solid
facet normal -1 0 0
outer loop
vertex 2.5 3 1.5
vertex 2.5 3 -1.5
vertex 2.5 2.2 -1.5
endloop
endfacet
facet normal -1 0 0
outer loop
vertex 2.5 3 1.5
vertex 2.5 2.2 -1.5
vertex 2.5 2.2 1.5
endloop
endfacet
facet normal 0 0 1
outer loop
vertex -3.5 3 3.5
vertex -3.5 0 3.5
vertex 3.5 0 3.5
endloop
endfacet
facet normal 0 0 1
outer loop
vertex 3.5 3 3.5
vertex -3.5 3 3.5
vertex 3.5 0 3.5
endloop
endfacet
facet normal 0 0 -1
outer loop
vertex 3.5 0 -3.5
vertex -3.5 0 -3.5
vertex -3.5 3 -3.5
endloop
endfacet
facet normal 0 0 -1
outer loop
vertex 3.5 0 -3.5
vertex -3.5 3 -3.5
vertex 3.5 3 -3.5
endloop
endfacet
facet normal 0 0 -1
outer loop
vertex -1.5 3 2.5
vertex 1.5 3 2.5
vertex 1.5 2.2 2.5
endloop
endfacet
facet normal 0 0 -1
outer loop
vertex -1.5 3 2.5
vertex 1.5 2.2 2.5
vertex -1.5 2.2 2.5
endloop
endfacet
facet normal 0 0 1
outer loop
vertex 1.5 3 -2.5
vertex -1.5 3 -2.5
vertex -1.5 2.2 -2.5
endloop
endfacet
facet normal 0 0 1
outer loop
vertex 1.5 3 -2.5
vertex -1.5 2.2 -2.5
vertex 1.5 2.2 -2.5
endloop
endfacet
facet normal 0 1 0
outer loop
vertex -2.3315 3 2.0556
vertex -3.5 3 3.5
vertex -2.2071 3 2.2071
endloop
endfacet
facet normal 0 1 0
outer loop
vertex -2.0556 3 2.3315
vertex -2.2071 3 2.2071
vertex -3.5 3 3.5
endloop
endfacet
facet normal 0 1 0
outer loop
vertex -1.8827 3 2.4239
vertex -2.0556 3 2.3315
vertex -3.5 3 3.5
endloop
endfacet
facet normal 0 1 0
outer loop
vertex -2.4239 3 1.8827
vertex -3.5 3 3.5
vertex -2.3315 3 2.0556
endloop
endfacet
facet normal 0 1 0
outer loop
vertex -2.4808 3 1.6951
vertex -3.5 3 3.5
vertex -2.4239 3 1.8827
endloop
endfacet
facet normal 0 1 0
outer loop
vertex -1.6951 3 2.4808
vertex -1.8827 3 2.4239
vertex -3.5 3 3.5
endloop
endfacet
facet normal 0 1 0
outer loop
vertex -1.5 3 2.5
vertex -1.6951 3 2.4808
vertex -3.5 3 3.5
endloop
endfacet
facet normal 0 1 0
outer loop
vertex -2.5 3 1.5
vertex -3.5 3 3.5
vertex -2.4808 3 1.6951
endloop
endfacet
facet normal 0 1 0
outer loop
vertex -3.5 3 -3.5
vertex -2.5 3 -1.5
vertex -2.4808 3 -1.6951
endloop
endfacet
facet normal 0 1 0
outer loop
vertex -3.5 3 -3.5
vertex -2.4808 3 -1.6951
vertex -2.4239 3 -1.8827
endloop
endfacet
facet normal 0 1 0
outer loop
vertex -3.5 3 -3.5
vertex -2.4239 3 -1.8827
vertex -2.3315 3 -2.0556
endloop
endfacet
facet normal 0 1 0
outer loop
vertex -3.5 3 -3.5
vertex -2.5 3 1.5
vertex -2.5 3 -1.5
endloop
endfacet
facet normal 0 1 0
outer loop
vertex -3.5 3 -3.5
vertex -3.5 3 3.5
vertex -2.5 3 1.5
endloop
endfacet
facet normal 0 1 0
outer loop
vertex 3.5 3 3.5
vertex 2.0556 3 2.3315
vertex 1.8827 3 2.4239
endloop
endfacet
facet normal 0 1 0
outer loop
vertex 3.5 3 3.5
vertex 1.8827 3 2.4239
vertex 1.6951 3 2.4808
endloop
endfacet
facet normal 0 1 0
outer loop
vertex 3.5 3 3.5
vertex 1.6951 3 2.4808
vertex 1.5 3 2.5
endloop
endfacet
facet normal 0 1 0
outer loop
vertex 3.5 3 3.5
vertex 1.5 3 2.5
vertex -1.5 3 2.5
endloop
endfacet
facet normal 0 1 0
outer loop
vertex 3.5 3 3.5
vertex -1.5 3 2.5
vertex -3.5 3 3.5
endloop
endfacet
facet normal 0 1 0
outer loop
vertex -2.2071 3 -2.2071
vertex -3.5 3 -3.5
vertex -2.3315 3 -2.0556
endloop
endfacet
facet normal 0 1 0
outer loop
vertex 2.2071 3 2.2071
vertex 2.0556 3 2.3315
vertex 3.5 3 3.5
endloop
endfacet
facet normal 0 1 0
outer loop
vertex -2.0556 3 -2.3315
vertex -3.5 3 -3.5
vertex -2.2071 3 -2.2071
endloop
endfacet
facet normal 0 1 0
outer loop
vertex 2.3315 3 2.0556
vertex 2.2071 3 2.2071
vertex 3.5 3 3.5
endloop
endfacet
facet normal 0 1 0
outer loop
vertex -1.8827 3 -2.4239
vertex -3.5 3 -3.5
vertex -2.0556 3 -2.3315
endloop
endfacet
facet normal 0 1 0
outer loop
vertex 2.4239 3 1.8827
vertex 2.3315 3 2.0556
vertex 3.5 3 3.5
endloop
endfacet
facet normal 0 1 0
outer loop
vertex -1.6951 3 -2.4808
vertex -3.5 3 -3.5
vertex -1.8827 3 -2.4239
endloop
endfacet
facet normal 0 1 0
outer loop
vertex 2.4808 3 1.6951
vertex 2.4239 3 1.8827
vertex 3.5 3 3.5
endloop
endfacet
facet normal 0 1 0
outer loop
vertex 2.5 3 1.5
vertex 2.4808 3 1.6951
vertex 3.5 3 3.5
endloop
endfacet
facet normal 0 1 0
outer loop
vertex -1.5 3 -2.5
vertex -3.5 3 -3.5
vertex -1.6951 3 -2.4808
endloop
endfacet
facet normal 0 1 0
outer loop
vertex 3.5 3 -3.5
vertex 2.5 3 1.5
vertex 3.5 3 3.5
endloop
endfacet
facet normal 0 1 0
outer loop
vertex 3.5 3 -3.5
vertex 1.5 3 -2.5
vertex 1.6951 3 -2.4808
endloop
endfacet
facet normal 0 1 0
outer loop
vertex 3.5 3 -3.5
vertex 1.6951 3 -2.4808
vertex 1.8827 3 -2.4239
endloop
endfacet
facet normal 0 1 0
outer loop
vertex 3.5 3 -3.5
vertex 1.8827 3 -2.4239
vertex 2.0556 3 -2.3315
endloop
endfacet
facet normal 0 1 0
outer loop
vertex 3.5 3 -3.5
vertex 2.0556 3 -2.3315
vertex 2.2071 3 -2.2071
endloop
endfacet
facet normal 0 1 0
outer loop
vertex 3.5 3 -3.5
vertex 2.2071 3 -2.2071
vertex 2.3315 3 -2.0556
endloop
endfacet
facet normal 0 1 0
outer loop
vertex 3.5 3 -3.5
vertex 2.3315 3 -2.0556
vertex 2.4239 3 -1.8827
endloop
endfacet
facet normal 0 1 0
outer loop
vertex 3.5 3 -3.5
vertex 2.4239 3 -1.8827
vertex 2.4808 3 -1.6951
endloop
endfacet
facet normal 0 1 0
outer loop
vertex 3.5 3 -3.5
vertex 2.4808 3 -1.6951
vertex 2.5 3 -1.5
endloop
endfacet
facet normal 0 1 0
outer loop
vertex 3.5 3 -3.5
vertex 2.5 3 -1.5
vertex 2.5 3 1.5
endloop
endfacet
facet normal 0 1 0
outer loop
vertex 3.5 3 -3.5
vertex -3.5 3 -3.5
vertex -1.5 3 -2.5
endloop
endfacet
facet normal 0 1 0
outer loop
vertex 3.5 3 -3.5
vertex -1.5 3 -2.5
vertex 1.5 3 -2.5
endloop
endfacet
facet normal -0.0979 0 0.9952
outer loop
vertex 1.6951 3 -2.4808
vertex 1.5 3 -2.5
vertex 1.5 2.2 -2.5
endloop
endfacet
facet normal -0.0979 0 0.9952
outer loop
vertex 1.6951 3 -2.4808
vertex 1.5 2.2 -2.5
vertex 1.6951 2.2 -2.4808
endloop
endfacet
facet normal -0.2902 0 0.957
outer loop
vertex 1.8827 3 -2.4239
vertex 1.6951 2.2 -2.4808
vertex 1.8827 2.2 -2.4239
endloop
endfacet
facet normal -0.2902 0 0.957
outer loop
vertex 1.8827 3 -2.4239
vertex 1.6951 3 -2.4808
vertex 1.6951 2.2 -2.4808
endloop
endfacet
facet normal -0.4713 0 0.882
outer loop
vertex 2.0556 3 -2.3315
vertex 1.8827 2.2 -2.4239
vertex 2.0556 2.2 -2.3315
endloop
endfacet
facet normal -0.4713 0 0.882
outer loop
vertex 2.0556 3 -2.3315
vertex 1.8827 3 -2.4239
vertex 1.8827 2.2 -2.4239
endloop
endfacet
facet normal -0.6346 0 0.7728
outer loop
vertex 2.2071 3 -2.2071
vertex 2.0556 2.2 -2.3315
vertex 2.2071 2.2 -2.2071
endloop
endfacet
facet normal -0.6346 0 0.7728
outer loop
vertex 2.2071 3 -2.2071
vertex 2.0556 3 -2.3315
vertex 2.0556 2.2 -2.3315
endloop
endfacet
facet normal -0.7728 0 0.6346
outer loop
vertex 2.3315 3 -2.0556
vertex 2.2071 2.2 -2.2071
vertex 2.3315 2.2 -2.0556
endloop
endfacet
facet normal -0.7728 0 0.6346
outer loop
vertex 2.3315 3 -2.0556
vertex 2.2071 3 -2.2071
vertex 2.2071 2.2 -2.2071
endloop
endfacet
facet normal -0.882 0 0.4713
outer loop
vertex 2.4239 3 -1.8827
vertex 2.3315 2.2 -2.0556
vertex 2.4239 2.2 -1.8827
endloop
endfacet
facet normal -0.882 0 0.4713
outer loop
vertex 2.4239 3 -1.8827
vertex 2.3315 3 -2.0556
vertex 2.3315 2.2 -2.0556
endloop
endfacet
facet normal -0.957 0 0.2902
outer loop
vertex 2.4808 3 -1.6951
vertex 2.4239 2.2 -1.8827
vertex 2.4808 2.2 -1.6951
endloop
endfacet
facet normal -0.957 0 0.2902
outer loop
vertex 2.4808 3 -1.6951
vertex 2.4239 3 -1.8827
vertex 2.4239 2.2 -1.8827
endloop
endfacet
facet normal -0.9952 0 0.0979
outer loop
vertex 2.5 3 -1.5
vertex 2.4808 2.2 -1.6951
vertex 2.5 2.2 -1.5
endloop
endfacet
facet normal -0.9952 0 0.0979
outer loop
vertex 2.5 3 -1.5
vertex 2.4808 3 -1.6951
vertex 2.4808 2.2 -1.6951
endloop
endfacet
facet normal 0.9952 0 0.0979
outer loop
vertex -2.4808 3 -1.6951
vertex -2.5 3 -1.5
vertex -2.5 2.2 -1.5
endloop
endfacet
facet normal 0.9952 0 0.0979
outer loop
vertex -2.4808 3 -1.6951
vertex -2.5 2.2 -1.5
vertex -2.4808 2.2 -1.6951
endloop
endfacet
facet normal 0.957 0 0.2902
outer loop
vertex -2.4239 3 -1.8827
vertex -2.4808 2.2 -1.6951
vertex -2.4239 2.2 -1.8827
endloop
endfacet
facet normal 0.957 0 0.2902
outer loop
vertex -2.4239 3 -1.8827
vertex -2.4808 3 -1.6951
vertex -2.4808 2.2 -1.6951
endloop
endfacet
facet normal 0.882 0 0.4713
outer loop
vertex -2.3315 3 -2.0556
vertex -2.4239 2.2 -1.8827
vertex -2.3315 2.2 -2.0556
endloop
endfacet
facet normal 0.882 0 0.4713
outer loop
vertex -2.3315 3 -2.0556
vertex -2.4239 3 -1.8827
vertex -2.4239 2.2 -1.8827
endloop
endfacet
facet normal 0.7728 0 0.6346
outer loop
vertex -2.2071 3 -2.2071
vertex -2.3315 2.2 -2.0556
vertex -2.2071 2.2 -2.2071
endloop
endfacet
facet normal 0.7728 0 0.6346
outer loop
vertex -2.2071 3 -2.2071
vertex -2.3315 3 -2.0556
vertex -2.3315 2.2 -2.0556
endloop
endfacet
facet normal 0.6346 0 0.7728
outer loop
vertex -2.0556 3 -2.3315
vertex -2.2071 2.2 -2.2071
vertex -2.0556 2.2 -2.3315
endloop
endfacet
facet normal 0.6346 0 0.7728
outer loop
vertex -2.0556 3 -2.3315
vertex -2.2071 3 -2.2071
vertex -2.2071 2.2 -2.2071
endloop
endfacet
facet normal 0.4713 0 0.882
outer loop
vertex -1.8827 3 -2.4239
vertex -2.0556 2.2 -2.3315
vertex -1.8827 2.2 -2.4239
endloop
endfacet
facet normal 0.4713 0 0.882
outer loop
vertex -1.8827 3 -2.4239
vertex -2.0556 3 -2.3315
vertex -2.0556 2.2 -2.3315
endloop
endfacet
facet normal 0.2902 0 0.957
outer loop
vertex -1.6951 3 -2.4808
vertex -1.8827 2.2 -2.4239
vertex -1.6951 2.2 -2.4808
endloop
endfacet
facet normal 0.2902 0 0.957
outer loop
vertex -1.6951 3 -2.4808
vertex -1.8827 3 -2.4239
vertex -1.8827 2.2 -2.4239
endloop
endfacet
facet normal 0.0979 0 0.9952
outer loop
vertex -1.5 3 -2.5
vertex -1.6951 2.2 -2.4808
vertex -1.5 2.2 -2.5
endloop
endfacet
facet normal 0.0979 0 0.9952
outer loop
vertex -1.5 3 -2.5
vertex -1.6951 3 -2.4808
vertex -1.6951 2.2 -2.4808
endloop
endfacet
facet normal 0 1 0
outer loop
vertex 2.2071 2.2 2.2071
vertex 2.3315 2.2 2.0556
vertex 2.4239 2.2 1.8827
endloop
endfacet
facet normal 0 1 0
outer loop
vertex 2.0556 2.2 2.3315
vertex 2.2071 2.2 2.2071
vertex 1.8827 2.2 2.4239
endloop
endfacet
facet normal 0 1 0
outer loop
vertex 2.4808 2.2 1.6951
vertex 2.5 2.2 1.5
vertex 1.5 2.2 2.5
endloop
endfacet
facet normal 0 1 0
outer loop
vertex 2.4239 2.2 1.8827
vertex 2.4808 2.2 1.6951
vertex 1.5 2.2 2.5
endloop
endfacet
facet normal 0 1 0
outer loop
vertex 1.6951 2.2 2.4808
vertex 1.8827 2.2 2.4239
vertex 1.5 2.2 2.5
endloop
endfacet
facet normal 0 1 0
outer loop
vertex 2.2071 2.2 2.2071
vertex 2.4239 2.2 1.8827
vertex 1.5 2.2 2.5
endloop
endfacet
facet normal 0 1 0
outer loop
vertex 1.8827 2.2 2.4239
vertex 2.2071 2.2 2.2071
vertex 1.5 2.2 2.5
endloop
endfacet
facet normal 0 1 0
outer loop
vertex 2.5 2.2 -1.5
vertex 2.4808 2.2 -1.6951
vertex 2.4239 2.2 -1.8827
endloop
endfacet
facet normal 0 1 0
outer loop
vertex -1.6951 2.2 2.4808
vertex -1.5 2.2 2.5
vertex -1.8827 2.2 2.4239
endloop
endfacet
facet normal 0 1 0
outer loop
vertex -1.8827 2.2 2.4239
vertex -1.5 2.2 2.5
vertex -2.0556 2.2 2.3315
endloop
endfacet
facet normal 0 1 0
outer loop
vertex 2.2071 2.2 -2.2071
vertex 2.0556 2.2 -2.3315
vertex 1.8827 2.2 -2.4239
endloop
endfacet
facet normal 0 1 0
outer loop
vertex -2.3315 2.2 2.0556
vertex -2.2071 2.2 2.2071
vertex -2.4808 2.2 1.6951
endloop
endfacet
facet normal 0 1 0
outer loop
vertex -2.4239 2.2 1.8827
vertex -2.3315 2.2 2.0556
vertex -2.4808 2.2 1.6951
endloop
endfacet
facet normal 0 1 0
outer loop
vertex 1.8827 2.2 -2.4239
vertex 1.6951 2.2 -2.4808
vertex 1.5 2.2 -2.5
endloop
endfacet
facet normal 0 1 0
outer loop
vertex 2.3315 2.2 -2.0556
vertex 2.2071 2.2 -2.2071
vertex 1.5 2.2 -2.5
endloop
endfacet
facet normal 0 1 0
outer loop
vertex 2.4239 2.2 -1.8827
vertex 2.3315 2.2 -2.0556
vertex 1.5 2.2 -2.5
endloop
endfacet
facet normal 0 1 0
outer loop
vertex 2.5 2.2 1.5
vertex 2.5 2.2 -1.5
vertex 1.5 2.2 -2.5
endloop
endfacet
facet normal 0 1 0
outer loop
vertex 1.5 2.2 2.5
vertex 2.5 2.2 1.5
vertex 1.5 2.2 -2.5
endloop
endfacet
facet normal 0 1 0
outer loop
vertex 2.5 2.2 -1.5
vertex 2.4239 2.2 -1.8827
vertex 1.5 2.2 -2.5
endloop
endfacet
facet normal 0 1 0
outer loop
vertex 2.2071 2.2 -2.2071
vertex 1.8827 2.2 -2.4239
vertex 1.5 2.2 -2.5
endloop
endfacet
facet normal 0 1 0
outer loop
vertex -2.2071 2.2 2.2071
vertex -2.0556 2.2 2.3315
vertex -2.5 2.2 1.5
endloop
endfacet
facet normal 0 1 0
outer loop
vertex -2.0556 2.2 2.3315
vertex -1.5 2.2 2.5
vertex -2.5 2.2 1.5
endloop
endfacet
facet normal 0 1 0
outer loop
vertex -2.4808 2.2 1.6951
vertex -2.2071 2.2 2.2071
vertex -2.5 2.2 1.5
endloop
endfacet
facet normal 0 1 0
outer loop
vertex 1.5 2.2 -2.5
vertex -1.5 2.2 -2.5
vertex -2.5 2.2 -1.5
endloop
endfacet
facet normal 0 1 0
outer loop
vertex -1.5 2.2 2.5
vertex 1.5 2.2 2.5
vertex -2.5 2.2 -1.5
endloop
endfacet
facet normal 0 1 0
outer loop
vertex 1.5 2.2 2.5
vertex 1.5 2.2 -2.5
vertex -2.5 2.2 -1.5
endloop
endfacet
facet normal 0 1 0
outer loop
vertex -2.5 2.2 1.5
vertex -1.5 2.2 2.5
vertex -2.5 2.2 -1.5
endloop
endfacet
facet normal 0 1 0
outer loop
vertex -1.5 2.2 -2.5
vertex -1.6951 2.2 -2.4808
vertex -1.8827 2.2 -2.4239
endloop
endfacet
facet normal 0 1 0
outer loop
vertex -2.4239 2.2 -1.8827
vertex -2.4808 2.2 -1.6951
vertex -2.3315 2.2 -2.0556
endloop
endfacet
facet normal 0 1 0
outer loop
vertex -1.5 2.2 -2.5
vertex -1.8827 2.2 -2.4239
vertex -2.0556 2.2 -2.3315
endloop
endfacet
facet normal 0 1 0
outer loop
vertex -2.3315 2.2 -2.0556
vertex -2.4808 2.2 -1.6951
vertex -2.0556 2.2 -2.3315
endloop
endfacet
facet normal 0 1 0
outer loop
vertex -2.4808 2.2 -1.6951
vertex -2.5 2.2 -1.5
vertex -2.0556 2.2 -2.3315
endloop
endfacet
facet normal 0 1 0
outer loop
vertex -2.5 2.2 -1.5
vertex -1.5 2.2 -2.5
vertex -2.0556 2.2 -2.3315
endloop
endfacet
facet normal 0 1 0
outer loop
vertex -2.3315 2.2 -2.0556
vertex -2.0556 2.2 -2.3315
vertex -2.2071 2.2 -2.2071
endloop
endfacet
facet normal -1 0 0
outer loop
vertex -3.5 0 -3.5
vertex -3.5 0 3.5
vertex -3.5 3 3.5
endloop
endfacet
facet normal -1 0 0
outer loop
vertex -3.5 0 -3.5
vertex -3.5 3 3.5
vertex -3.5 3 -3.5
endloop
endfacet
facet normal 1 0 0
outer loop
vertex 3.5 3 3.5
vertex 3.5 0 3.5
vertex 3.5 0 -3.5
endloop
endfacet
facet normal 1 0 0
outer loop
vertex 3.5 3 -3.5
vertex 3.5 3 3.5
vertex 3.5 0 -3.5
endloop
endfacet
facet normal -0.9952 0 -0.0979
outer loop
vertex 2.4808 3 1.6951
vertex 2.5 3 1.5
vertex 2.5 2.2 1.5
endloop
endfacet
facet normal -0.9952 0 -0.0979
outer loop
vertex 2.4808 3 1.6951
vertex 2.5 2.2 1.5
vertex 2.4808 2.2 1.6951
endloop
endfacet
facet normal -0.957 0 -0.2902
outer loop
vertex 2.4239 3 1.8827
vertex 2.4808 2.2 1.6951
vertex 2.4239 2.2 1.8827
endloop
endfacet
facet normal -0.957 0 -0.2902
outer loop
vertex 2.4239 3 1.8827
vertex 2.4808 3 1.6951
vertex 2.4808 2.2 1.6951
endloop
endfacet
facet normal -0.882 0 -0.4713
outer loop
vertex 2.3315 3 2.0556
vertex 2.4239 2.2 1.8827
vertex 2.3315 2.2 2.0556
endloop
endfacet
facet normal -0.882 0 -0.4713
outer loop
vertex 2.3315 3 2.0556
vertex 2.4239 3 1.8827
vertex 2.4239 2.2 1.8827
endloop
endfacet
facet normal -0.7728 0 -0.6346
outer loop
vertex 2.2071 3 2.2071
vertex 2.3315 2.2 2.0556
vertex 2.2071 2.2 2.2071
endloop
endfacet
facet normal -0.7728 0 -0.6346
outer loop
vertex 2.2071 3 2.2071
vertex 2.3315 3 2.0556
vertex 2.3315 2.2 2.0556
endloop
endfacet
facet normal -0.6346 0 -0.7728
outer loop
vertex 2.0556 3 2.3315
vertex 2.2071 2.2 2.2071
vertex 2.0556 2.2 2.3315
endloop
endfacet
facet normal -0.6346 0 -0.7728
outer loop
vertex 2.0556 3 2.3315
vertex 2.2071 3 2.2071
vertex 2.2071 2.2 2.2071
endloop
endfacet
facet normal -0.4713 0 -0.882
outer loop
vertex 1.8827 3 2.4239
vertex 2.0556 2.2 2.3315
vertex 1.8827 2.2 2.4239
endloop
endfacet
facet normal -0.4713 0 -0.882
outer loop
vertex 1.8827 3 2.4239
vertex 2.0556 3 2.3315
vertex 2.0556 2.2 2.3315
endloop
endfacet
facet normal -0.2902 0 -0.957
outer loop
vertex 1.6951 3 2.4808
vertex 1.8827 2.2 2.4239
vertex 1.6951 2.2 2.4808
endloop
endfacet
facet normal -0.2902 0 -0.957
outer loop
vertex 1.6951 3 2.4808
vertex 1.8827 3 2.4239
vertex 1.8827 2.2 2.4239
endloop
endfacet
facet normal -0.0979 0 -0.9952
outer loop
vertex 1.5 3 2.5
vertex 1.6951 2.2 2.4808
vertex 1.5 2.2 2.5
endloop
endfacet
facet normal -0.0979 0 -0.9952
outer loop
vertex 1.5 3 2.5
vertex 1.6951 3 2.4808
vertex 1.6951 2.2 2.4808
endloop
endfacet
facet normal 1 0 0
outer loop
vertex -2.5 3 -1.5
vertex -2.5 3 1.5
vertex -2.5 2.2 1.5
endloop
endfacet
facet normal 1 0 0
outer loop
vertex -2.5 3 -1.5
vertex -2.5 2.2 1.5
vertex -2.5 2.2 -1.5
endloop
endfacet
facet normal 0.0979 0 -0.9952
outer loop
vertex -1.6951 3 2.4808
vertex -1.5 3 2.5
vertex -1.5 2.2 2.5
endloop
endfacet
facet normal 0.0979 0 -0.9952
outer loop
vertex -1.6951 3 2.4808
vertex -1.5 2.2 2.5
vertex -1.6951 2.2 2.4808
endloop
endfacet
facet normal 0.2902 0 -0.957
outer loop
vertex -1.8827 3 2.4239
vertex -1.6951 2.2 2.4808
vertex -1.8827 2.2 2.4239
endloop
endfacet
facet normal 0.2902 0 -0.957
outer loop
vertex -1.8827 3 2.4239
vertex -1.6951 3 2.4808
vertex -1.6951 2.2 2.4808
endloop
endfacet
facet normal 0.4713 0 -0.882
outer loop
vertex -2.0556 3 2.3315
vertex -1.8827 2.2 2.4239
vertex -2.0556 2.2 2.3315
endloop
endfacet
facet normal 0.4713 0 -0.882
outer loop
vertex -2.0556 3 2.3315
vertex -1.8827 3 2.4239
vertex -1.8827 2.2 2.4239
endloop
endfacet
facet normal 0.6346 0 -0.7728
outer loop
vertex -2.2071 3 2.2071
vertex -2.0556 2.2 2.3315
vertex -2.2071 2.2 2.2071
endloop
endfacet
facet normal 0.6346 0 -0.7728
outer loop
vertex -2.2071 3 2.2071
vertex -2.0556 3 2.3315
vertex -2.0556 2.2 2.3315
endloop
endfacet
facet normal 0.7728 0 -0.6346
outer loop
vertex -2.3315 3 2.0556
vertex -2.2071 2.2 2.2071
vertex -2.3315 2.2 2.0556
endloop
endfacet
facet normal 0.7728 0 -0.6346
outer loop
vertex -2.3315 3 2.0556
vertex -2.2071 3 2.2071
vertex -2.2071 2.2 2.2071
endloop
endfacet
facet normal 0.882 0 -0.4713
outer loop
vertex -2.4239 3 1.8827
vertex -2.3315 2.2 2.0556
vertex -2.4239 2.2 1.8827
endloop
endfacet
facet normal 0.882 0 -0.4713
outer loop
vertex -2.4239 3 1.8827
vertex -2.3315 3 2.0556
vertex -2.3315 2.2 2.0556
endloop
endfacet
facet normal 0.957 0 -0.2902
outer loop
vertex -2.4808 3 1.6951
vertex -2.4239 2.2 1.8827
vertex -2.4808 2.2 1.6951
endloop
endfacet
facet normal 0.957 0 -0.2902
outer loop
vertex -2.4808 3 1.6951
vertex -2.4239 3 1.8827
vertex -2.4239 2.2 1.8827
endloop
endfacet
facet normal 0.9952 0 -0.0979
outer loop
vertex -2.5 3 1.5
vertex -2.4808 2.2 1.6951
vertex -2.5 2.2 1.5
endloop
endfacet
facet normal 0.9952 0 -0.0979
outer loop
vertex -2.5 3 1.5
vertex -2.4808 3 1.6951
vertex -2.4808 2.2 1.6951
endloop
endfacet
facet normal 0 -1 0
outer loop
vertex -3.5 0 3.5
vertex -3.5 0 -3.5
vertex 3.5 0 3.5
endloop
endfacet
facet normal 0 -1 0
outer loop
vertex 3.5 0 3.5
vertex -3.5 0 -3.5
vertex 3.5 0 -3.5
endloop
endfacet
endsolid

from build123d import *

# Parameters (mm, degrees)
SKETCH1_W           = 7
SKETCH1_H           = 7
BOSS_EXTRUDE1_DEPTH = 3
CUT_EXTRUDE1_DEPTH  = 0.8


with BuildPart() as part:
    # Sketch1 → Boss-Extrude1 (new body)
    with BuildSketch(Plane(origin=(0, 0, 0), x_dir=(1, 0, 0), z_dir=(0, 1, 0))):
        Rectangle(SKETCH1_W, SKETCH1_H)
    extrude(amount=BOSS_EXTRUDE1_DEPTH)

    # Sketch2 → Cut-Extrude1 (cut)
    with BuildSketch(Plane(origin=(0, 3, 0), x_dir=(1, 0, 0), z_dir=(0, 1, 0))):
        with BuildLine():
            Line((-1.5, 2.5), (1.5, 2.5))
            ThreePointArc((1.5, 2.5), (2.207106781, 2.207106781), (2.5, 1.5))
            Line((2.5, 1.5), (2.5, -1.5))
            ThreePointArc((2.5, -1.5), (2.207106781, -2.207106781), (1.5, -2.5))
            Line((1.5, -2.5), (-1.5, -2.5))
            ThreePointArc((-1.5, -2.5), (-2.207106781, -2.207106781), (-2.5, -1.5))
            Line((-2.5, -1.5), (-2.5, 1.5))
            ThreePointArc((-2.5, 1.5), (-2.207106781, 2.207106781), (-1.5, 2.5))
        make_face()
    extrude(amount=-CUT_EXTRUDE1_DEPTH, mode=Mode.SUBTRACT)


solid = part.part
